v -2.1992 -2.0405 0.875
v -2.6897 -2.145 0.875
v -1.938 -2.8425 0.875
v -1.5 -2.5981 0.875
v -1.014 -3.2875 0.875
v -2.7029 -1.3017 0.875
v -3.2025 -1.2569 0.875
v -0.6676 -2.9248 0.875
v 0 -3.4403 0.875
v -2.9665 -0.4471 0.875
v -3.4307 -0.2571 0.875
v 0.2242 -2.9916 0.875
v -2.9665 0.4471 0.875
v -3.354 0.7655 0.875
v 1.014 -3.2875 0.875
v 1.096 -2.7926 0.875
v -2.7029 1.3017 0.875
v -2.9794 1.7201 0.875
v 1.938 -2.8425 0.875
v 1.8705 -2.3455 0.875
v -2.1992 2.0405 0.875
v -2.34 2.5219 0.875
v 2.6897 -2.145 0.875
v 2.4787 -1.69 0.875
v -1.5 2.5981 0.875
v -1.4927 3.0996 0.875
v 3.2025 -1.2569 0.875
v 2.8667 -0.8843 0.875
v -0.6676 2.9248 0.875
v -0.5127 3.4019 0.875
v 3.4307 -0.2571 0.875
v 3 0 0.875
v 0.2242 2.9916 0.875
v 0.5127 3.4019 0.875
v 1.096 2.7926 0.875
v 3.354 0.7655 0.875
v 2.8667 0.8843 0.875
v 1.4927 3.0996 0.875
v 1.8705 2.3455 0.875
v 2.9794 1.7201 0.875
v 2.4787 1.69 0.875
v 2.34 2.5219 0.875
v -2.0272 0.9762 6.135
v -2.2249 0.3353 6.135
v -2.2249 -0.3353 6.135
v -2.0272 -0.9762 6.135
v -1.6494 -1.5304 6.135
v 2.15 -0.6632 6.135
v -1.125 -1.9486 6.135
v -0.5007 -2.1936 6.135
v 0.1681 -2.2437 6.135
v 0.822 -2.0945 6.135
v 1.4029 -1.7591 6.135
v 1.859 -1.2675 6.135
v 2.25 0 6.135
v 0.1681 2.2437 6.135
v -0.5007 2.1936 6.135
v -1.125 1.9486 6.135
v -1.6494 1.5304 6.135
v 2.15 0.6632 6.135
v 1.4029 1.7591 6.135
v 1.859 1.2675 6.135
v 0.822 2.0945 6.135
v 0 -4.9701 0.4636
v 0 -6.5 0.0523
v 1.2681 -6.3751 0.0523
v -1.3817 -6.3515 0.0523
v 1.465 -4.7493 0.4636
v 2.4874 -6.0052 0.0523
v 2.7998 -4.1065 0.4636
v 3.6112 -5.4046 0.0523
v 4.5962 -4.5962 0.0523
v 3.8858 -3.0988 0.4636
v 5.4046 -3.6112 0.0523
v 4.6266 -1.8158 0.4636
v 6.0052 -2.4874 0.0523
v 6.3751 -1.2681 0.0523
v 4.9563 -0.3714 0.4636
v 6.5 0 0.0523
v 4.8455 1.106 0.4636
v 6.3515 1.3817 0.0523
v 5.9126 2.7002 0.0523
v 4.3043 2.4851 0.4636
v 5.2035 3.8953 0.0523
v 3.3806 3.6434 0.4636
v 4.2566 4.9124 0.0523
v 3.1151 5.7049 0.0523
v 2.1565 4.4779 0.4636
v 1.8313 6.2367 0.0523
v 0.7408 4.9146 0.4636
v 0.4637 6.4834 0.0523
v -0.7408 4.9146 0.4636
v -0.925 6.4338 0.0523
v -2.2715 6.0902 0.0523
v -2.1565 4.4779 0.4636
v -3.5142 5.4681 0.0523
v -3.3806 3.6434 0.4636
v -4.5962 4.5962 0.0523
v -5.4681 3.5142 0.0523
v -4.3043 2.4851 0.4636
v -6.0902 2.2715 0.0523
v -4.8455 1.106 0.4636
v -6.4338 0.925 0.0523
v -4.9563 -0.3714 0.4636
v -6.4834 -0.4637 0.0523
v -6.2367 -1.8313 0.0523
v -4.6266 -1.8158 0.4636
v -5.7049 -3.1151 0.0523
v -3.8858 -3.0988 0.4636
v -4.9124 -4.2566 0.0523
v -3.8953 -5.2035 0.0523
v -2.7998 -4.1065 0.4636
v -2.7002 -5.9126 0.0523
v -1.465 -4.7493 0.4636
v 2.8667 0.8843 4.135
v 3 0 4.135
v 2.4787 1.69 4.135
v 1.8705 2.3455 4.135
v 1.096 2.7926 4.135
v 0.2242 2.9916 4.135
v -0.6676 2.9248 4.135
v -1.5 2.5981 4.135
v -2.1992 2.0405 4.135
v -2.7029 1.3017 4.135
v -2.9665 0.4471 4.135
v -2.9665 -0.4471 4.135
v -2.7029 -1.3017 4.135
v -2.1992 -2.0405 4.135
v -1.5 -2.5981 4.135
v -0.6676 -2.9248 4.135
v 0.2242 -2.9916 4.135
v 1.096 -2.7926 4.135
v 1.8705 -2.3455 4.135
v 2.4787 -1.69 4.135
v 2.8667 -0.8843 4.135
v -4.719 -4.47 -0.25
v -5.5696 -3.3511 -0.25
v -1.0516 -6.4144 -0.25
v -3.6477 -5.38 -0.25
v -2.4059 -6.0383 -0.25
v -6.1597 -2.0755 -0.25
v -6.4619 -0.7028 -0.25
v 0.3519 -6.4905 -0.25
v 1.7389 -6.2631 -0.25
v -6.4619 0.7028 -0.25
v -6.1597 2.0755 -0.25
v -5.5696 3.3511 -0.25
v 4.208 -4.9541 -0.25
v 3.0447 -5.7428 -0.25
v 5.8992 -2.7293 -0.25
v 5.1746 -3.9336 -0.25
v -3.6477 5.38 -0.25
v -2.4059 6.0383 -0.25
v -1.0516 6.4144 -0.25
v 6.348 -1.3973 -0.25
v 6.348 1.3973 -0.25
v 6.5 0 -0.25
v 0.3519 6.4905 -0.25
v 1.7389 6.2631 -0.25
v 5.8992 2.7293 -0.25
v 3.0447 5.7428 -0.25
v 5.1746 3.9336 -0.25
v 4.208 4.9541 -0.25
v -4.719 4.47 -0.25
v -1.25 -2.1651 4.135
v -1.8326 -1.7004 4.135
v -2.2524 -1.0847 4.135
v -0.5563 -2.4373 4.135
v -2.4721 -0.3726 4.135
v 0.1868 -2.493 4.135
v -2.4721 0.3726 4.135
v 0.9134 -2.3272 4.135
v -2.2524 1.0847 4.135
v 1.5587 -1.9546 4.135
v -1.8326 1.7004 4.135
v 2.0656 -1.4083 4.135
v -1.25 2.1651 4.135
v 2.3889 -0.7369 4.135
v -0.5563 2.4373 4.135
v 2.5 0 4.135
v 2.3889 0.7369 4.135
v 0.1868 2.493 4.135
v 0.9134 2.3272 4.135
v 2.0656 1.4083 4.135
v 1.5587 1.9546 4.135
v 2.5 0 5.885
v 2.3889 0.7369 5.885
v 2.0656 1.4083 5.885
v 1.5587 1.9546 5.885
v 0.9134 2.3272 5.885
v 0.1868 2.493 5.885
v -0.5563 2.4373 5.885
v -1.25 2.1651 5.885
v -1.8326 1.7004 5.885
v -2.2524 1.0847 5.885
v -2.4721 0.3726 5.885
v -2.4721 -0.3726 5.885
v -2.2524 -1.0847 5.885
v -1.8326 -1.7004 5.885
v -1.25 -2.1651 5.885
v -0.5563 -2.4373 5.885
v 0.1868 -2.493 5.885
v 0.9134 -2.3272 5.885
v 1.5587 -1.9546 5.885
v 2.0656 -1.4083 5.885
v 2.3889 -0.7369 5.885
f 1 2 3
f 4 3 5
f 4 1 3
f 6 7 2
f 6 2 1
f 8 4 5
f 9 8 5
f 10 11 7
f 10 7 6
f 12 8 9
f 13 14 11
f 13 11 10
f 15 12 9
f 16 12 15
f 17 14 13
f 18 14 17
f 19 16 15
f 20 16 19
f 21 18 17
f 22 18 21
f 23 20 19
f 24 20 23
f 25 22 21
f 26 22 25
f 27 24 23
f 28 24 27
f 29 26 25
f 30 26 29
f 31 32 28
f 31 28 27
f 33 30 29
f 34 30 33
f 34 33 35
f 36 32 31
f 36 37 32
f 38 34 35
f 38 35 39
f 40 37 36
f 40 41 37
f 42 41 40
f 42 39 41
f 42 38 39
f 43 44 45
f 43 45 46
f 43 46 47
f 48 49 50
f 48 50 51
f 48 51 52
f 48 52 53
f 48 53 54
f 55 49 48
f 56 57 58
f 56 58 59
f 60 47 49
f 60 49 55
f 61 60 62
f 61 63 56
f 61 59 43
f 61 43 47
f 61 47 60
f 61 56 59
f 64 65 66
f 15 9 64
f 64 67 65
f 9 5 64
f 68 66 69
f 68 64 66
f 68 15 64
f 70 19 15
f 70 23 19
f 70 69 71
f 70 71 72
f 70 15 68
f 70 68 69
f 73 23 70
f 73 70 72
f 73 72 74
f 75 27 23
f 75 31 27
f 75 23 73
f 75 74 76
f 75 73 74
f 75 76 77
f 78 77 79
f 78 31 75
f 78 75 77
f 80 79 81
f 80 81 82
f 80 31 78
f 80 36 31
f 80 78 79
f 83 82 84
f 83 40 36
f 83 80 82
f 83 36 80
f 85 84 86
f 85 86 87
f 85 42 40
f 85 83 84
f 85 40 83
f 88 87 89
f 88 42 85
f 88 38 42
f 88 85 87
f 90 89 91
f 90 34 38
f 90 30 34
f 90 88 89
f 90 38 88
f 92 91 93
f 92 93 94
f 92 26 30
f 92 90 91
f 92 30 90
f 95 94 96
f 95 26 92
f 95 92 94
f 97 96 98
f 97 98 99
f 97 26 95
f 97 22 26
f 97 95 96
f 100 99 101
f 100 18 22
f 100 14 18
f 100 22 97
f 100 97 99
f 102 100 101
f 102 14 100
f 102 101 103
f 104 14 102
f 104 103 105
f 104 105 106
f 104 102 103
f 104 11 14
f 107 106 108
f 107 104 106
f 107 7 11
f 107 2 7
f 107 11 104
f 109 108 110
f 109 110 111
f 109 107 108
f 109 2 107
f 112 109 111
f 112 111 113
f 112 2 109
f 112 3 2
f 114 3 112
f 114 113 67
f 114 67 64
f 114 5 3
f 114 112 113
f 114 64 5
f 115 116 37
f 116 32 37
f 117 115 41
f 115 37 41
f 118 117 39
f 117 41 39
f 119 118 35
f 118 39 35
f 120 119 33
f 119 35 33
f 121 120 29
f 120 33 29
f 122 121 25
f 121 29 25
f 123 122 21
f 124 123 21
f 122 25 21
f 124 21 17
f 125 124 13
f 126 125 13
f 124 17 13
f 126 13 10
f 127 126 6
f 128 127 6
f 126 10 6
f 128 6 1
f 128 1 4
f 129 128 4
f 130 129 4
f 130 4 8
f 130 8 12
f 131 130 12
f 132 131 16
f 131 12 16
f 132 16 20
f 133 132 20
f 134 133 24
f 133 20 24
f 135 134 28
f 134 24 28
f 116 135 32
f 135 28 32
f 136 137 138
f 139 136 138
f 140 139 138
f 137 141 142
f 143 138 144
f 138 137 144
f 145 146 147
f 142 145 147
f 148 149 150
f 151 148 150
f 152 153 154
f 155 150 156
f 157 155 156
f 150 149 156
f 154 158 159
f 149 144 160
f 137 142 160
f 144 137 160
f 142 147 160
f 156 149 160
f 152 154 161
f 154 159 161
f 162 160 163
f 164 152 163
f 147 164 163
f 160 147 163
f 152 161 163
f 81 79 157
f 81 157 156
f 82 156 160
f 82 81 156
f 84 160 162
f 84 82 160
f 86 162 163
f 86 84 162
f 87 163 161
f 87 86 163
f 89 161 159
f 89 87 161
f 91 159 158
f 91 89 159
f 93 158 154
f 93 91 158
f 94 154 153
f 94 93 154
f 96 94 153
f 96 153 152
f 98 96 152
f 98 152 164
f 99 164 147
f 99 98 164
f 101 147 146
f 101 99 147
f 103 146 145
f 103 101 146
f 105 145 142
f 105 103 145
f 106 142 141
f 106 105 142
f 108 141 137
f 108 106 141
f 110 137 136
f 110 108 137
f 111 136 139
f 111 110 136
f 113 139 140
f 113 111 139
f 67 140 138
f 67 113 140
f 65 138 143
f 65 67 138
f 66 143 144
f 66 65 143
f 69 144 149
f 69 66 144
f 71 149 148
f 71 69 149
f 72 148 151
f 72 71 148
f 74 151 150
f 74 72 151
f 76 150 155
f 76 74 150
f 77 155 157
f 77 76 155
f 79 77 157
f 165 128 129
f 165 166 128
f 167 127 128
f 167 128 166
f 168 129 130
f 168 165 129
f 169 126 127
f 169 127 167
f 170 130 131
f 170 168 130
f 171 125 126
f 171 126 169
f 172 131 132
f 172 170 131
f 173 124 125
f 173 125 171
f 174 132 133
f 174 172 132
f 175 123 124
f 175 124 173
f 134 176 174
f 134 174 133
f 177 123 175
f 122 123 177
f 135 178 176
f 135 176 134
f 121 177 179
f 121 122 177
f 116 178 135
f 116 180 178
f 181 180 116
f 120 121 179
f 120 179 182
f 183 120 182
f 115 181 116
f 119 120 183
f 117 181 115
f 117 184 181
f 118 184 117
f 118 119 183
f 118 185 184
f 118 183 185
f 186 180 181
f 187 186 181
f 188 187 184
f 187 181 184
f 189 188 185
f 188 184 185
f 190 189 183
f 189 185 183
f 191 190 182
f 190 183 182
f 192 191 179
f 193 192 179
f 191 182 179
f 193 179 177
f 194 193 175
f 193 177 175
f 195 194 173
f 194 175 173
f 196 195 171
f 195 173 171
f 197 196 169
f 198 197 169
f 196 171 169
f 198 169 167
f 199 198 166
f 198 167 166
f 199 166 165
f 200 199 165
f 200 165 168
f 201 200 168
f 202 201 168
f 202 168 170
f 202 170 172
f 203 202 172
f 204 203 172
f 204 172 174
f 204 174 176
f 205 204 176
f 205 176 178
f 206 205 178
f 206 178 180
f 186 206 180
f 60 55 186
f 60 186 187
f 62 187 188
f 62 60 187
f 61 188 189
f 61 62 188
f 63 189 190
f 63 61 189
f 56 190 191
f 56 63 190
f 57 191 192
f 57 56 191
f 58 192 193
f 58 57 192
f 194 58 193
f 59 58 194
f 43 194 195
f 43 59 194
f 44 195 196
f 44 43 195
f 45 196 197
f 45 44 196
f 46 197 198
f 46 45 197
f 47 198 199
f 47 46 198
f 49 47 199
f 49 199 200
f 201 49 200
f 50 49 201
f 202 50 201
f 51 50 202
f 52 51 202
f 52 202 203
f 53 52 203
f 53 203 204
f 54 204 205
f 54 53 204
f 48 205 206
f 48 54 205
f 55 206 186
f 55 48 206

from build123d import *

# Parameters (mm, degrees)
F0_R     = 2.5
F1_DEPTH = 3.375
F0_R_2   = 3
F2_DEPTH = 1.375
F0_R_3   = 6.5
F3_DEPTH = 0.875
F4_DEPTH = 0.25
F7_DEPTH = 2.76
F8_DEPTH = 2.76
F9_SIZE  = 0.25


with BuildPart() as f1:
    # F0 (on Top) → F1 (new body)
    with BuildSketch(Plane.XY):
        Circle(F0_R)
    extrude(amount=F1_DEPTH)

    # F0 (on Top) → F2 (join)
    with BuildSketch(Plane.XY):
        Circle(F0_R_2)
        Circle(F0_R, mode=Mode.SUBTRACT)
    extrude(amount=F2_DEPTH)

    # F0 (on Top) → F3 (join)
    with BuildSketch(Plane.XY):
        Circle(F0_R_3)
        Circle(F0_R_2, mode=Mode.SUBTRACT)
    extrude(amount=F3_DEPTH)

    # F0 (on Top) → F4 (join)
    with BuildSketch(Plane.XY):
        Circle(F0_R_3)
        Circle(F0_R_2, mode=Mode.SUBTRACT)
        Circle(F0_R_2)
        Circle(F0_R, mode=Mode.SUBTRACT)
        Circle(F0_R)
    extrude(amount=-F4_DEPTH)

    # F5 (on Right) → F6 (revolve, cut)
    with BuildSketch(Plane.YZ):
        Polygon((-6.6943974234, 0.9619678603), (-6.6943974234, 0), (-3.1168663409, 0.9619678603), align=None)
    revolve(axis=Axis((0, 0, 0.9346584557), (0, 0, 1)), mode=Mode.SUBTRACT)

    # F7 (add): a face of the model
    f7_faces = [f1.faces().sort_by_distance(p)[0] for p in [
        (-2.9151471863, 0, 1.375),
    ]]
    extrude(f7_faces, amount=F7_DEPTH)

    # F8 (add): a face of the model
    f8_faces = [f1.faces().sort_by_distance(p)[0] for p in [
        (0, 0, 3.375),
    ]]
    extrude(f8_faces, amount=F8_DEPTH)

    # F9
    f9_edges = [f1.edges().sort_by_distance(p)[0] for p in [
        (-2.5, 0, 6.135),
    ]]
    chamfer(f9_edges, length=F9_SIZE)


solid = f1.part
